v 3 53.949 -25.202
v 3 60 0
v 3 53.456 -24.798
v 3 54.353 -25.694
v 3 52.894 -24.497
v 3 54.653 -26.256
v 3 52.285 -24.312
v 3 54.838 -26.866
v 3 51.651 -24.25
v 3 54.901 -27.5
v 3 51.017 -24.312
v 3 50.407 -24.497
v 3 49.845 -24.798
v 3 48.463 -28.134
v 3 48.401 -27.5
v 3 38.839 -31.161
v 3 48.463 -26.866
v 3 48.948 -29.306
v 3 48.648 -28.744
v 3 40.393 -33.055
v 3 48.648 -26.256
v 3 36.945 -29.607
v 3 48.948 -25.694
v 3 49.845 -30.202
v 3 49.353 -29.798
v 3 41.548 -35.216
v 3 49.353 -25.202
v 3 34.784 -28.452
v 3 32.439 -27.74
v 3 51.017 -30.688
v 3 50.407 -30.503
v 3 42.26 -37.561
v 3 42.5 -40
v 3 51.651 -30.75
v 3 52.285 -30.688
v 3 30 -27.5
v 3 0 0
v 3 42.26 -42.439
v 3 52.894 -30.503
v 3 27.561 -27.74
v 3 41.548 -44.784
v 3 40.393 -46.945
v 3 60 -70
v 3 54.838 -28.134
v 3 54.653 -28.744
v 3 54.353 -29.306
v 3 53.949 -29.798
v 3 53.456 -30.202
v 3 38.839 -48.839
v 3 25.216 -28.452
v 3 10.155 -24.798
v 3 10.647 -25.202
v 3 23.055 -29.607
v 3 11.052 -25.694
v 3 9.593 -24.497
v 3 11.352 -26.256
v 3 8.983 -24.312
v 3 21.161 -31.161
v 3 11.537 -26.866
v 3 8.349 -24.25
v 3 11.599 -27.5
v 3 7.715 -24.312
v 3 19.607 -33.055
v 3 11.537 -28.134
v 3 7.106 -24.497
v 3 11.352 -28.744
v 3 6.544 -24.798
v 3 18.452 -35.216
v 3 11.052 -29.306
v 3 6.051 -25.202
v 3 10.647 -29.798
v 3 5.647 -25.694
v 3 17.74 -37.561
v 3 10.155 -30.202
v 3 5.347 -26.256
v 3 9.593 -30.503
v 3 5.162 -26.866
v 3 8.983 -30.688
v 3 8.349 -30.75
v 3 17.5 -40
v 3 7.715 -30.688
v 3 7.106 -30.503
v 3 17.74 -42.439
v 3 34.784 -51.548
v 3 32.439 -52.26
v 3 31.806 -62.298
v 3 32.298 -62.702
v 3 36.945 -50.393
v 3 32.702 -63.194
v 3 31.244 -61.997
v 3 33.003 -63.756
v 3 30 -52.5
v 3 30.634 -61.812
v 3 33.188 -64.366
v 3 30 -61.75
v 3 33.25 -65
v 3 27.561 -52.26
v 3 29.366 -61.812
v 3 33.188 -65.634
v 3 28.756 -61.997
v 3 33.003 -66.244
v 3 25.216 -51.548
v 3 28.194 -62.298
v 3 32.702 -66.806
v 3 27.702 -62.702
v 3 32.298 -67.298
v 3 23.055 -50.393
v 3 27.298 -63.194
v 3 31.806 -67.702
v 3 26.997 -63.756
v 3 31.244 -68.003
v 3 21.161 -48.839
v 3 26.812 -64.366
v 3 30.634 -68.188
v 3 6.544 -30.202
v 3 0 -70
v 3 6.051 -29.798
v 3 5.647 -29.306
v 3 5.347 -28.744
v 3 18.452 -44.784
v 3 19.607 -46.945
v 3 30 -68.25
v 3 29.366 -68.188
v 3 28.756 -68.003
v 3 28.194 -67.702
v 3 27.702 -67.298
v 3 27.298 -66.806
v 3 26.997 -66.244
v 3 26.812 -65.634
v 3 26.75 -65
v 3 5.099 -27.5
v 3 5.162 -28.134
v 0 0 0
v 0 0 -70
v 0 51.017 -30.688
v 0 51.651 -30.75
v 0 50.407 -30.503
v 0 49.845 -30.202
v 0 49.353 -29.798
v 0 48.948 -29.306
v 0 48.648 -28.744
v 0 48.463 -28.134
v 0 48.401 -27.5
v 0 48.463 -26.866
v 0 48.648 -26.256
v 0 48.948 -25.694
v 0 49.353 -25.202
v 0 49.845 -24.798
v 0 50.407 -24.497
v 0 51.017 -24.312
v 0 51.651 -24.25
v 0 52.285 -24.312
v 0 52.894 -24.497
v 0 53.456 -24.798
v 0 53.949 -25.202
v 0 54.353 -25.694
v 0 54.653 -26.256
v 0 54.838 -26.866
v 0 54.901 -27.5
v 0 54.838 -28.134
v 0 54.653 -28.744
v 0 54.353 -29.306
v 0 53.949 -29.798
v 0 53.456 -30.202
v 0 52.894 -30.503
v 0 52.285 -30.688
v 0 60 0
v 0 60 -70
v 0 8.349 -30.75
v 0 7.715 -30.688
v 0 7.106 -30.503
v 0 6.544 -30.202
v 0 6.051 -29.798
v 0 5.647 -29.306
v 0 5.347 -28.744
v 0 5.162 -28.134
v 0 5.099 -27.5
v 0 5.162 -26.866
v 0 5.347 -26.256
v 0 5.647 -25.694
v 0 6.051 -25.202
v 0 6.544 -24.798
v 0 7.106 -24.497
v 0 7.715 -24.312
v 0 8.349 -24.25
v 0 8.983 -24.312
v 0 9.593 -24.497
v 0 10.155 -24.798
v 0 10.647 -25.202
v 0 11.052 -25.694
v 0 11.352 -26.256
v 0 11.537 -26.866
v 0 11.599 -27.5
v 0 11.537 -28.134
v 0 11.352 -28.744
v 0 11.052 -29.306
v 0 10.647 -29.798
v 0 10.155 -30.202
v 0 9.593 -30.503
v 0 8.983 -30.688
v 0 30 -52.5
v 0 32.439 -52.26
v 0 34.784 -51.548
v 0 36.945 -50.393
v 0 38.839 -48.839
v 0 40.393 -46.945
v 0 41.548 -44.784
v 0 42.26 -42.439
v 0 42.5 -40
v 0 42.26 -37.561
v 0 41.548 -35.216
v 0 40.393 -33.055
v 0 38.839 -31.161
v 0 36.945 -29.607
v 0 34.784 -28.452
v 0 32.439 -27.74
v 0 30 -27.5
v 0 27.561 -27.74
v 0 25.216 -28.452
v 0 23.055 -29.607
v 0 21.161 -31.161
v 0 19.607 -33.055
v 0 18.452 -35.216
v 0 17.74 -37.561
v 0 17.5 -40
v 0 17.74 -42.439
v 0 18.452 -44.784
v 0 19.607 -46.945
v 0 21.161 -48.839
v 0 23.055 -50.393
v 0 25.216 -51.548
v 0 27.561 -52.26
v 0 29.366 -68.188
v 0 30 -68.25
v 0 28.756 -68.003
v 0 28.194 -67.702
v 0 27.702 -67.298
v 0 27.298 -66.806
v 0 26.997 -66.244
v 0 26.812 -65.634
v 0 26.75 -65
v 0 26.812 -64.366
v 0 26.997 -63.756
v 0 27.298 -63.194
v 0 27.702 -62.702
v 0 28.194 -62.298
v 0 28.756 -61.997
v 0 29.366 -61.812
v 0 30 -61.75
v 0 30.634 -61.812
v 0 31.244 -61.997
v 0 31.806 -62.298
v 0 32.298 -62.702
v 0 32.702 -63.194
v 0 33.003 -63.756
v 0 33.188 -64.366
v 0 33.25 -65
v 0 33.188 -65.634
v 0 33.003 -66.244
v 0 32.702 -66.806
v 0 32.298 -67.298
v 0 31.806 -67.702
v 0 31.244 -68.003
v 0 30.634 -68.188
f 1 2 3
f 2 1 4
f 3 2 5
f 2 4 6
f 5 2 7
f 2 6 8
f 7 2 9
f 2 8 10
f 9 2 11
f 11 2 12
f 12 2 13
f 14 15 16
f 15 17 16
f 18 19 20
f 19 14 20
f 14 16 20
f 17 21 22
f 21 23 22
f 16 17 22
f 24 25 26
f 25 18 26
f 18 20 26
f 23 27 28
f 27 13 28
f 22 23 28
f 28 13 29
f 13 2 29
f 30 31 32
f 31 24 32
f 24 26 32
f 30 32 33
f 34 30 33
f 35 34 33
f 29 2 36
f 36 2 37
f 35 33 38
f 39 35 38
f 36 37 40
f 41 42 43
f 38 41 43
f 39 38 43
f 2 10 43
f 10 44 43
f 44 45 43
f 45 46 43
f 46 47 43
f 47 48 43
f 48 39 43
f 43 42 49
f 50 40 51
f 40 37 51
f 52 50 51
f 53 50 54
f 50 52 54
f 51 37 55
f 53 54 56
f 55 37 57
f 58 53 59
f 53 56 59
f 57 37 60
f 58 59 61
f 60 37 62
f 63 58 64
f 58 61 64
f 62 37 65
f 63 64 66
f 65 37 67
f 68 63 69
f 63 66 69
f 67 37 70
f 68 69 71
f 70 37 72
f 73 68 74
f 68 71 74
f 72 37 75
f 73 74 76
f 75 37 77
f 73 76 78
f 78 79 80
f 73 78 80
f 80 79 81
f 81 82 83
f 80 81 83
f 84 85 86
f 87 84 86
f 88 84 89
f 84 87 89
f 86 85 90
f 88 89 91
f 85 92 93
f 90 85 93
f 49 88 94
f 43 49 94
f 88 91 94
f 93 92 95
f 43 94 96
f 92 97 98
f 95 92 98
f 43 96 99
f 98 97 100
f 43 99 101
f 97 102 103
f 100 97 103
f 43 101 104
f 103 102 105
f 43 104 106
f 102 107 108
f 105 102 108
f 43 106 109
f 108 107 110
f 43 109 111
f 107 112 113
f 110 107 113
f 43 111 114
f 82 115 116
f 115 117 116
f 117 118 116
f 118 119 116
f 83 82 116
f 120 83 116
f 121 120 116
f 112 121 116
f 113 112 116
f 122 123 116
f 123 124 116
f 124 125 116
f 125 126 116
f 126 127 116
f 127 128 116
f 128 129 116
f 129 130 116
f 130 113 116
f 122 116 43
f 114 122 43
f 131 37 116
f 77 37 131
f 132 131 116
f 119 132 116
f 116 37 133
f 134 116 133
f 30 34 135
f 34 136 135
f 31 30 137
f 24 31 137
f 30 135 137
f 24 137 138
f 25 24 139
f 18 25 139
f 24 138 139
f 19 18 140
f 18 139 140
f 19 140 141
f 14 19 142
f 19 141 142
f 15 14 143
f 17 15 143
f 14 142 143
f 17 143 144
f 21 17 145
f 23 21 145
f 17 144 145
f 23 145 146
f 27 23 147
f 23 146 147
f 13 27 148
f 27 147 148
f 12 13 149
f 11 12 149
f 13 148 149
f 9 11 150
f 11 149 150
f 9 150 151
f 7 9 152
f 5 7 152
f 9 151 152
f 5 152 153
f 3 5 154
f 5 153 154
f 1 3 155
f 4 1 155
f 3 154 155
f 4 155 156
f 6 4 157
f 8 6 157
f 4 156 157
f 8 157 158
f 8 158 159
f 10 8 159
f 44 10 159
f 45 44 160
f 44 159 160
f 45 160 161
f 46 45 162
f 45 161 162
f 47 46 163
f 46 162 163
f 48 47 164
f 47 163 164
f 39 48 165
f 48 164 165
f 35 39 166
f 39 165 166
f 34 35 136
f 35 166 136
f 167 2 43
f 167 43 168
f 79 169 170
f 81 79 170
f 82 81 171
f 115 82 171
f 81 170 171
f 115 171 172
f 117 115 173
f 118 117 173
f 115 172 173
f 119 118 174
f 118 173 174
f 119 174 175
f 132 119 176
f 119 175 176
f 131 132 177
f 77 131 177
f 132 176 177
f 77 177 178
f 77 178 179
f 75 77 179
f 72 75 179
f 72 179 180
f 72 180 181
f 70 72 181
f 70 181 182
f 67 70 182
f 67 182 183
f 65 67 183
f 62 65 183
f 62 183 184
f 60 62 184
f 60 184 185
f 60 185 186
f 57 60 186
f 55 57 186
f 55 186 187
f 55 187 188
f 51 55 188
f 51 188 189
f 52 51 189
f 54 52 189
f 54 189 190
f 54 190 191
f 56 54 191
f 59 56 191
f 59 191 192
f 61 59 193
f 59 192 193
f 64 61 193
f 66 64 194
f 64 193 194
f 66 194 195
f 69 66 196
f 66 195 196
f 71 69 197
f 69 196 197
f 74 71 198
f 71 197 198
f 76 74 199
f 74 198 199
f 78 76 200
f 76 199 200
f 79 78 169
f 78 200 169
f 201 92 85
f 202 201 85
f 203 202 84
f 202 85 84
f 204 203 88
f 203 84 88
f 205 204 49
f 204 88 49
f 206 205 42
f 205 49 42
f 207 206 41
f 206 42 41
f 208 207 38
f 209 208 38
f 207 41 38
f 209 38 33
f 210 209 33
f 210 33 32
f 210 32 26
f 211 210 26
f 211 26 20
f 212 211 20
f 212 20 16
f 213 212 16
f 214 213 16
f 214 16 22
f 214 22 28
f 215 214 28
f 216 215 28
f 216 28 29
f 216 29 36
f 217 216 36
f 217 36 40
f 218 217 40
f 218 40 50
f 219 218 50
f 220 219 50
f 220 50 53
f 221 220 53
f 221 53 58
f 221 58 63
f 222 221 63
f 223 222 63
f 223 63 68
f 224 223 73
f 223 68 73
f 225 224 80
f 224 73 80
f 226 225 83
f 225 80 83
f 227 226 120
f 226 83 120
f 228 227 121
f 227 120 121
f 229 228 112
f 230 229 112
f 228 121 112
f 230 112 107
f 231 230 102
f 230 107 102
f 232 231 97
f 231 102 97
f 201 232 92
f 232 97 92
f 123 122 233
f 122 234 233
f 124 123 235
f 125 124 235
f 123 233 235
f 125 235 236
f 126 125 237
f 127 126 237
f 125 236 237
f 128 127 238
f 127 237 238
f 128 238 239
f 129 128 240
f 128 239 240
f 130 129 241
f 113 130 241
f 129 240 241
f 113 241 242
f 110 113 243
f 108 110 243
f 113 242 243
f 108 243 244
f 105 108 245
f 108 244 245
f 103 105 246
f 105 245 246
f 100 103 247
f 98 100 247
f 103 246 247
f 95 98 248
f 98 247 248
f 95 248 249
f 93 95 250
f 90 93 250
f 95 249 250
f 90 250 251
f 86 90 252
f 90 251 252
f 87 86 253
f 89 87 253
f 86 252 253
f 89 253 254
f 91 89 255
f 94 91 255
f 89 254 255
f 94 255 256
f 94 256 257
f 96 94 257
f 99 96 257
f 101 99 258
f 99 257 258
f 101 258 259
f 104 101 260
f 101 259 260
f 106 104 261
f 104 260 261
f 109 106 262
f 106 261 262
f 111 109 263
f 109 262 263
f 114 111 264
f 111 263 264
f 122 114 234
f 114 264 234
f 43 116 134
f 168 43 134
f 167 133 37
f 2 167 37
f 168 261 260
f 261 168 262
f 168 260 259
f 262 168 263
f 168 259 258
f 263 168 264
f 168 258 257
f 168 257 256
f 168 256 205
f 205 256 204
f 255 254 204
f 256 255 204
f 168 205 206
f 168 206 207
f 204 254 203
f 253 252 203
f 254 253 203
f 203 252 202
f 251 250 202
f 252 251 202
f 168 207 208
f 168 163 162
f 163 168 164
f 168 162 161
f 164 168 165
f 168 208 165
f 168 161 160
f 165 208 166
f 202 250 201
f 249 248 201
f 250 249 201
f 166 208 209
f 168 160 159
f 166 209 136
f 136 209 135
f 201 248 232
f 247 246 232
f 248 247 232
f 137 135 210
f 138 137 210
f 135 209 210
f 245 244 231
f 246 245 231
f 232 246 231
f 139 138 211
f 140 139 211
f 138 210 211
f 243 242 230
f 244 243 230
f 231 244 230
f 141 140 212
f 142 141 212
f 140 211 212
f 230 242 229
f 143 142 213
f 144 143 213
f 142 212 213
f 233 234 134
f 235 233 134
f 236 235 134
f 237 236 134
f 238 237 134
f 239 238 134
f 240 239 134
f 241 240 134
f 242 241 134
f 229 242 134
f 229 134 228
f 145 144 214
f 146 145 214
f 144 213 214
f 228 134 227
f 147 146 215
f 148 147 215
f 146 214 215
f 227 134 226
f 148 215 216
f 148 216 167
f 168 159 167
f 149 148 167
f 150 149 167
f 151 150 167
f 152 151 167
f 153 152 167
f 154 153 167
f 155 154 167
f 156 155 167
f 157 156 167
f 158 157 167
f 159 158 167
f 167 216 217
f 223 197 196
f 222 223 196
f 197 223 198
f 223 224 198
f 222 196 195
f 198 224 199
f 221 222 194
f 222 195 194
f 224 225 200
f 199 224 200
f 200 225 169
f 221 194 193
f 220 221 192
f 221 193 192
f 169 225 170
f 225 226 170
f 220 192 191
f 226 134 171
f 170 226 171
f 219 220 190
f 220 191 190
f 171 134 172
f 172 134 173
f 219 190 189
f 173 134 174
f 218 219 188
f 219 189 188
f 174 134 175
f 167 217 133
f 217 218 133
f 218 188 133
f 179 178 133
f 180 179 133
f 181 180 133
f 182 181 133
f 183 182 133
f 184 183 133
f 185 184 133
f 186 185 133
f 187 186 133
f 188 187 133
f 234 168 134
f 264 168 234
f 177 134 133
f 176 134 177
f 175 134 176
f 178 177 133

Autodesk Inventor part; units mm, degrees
ref_plane "YZ Plane" through (0, 0, 0) normal (1, 0, 0) x (0, 1, 0)
ref_plane "XZ Plane" through (0, 0, 0) normal (0, 1, 0) x (-1, 0, 0)
ref_plane "XY Plane" through (0, 0, 0) normal (0, 0, 1) x (1, 0, 0)
sketch "Sketch1" plane through (0, 0, 0) normal (0, 1, 0) x (-1, 0, 0)
  line L0 (0, 0) -> (-3, 0)
  line L1 (-3, 0) -> (-3, -70)
  line L2 (-3, -70) -> (0, -70)
  line L3 (0, -70) -> (0, 0)
  line L4 (0, -3) -> (0, 0)
  dimension "d0" = 3
  dimension "d1" = 70
extrude "Extrusion1" add sketch "Sketch1" along normal blind 60
sketch "Sketch2" plane through (3, 0, -3) normal (1, 0, 0) x (0, 0, -1)
  line L0 (67, 0) -> (-3, 0) projected
  line L1 (-3, 0) -> (37, 0) construction
  line L2 (37, 0) -> (37, 30) construction
  line L3 (37, 30) -> (-3, 30) construction
  line L4 (-3, 30) -> (-3, 0) construction
  circle A0 centre (37, 30) radius 25
  line L5 (37, 30) -> (62, 30) construction
  circle A1 centre (62, 30) radius 3.25
  circle A2 centre (24.5, 51.6506) radius 3.25
  circle A3 centre (24.5, 8.3494) radius 3.25
  circle A4 centre (37, 30) radius 12.5
  dimension "d8" = 50
  dimension "d6" = 30
  dimension "d7" = 40
  dimension "d9" = 6.5
  dimension "d12" = 360
  dimension "d36" = 25
hole "Hole1" at (3, 8.3494, -27.5) at (3, 51.6506, -27.5) at (3, 30, -65) direction (-1, 0, 0) diameter 6.5 depth 10
extrude "Extrusion2" cut sketch "Sketch2" against normal blind 50 contours A4
properties part number "motorbracket"
